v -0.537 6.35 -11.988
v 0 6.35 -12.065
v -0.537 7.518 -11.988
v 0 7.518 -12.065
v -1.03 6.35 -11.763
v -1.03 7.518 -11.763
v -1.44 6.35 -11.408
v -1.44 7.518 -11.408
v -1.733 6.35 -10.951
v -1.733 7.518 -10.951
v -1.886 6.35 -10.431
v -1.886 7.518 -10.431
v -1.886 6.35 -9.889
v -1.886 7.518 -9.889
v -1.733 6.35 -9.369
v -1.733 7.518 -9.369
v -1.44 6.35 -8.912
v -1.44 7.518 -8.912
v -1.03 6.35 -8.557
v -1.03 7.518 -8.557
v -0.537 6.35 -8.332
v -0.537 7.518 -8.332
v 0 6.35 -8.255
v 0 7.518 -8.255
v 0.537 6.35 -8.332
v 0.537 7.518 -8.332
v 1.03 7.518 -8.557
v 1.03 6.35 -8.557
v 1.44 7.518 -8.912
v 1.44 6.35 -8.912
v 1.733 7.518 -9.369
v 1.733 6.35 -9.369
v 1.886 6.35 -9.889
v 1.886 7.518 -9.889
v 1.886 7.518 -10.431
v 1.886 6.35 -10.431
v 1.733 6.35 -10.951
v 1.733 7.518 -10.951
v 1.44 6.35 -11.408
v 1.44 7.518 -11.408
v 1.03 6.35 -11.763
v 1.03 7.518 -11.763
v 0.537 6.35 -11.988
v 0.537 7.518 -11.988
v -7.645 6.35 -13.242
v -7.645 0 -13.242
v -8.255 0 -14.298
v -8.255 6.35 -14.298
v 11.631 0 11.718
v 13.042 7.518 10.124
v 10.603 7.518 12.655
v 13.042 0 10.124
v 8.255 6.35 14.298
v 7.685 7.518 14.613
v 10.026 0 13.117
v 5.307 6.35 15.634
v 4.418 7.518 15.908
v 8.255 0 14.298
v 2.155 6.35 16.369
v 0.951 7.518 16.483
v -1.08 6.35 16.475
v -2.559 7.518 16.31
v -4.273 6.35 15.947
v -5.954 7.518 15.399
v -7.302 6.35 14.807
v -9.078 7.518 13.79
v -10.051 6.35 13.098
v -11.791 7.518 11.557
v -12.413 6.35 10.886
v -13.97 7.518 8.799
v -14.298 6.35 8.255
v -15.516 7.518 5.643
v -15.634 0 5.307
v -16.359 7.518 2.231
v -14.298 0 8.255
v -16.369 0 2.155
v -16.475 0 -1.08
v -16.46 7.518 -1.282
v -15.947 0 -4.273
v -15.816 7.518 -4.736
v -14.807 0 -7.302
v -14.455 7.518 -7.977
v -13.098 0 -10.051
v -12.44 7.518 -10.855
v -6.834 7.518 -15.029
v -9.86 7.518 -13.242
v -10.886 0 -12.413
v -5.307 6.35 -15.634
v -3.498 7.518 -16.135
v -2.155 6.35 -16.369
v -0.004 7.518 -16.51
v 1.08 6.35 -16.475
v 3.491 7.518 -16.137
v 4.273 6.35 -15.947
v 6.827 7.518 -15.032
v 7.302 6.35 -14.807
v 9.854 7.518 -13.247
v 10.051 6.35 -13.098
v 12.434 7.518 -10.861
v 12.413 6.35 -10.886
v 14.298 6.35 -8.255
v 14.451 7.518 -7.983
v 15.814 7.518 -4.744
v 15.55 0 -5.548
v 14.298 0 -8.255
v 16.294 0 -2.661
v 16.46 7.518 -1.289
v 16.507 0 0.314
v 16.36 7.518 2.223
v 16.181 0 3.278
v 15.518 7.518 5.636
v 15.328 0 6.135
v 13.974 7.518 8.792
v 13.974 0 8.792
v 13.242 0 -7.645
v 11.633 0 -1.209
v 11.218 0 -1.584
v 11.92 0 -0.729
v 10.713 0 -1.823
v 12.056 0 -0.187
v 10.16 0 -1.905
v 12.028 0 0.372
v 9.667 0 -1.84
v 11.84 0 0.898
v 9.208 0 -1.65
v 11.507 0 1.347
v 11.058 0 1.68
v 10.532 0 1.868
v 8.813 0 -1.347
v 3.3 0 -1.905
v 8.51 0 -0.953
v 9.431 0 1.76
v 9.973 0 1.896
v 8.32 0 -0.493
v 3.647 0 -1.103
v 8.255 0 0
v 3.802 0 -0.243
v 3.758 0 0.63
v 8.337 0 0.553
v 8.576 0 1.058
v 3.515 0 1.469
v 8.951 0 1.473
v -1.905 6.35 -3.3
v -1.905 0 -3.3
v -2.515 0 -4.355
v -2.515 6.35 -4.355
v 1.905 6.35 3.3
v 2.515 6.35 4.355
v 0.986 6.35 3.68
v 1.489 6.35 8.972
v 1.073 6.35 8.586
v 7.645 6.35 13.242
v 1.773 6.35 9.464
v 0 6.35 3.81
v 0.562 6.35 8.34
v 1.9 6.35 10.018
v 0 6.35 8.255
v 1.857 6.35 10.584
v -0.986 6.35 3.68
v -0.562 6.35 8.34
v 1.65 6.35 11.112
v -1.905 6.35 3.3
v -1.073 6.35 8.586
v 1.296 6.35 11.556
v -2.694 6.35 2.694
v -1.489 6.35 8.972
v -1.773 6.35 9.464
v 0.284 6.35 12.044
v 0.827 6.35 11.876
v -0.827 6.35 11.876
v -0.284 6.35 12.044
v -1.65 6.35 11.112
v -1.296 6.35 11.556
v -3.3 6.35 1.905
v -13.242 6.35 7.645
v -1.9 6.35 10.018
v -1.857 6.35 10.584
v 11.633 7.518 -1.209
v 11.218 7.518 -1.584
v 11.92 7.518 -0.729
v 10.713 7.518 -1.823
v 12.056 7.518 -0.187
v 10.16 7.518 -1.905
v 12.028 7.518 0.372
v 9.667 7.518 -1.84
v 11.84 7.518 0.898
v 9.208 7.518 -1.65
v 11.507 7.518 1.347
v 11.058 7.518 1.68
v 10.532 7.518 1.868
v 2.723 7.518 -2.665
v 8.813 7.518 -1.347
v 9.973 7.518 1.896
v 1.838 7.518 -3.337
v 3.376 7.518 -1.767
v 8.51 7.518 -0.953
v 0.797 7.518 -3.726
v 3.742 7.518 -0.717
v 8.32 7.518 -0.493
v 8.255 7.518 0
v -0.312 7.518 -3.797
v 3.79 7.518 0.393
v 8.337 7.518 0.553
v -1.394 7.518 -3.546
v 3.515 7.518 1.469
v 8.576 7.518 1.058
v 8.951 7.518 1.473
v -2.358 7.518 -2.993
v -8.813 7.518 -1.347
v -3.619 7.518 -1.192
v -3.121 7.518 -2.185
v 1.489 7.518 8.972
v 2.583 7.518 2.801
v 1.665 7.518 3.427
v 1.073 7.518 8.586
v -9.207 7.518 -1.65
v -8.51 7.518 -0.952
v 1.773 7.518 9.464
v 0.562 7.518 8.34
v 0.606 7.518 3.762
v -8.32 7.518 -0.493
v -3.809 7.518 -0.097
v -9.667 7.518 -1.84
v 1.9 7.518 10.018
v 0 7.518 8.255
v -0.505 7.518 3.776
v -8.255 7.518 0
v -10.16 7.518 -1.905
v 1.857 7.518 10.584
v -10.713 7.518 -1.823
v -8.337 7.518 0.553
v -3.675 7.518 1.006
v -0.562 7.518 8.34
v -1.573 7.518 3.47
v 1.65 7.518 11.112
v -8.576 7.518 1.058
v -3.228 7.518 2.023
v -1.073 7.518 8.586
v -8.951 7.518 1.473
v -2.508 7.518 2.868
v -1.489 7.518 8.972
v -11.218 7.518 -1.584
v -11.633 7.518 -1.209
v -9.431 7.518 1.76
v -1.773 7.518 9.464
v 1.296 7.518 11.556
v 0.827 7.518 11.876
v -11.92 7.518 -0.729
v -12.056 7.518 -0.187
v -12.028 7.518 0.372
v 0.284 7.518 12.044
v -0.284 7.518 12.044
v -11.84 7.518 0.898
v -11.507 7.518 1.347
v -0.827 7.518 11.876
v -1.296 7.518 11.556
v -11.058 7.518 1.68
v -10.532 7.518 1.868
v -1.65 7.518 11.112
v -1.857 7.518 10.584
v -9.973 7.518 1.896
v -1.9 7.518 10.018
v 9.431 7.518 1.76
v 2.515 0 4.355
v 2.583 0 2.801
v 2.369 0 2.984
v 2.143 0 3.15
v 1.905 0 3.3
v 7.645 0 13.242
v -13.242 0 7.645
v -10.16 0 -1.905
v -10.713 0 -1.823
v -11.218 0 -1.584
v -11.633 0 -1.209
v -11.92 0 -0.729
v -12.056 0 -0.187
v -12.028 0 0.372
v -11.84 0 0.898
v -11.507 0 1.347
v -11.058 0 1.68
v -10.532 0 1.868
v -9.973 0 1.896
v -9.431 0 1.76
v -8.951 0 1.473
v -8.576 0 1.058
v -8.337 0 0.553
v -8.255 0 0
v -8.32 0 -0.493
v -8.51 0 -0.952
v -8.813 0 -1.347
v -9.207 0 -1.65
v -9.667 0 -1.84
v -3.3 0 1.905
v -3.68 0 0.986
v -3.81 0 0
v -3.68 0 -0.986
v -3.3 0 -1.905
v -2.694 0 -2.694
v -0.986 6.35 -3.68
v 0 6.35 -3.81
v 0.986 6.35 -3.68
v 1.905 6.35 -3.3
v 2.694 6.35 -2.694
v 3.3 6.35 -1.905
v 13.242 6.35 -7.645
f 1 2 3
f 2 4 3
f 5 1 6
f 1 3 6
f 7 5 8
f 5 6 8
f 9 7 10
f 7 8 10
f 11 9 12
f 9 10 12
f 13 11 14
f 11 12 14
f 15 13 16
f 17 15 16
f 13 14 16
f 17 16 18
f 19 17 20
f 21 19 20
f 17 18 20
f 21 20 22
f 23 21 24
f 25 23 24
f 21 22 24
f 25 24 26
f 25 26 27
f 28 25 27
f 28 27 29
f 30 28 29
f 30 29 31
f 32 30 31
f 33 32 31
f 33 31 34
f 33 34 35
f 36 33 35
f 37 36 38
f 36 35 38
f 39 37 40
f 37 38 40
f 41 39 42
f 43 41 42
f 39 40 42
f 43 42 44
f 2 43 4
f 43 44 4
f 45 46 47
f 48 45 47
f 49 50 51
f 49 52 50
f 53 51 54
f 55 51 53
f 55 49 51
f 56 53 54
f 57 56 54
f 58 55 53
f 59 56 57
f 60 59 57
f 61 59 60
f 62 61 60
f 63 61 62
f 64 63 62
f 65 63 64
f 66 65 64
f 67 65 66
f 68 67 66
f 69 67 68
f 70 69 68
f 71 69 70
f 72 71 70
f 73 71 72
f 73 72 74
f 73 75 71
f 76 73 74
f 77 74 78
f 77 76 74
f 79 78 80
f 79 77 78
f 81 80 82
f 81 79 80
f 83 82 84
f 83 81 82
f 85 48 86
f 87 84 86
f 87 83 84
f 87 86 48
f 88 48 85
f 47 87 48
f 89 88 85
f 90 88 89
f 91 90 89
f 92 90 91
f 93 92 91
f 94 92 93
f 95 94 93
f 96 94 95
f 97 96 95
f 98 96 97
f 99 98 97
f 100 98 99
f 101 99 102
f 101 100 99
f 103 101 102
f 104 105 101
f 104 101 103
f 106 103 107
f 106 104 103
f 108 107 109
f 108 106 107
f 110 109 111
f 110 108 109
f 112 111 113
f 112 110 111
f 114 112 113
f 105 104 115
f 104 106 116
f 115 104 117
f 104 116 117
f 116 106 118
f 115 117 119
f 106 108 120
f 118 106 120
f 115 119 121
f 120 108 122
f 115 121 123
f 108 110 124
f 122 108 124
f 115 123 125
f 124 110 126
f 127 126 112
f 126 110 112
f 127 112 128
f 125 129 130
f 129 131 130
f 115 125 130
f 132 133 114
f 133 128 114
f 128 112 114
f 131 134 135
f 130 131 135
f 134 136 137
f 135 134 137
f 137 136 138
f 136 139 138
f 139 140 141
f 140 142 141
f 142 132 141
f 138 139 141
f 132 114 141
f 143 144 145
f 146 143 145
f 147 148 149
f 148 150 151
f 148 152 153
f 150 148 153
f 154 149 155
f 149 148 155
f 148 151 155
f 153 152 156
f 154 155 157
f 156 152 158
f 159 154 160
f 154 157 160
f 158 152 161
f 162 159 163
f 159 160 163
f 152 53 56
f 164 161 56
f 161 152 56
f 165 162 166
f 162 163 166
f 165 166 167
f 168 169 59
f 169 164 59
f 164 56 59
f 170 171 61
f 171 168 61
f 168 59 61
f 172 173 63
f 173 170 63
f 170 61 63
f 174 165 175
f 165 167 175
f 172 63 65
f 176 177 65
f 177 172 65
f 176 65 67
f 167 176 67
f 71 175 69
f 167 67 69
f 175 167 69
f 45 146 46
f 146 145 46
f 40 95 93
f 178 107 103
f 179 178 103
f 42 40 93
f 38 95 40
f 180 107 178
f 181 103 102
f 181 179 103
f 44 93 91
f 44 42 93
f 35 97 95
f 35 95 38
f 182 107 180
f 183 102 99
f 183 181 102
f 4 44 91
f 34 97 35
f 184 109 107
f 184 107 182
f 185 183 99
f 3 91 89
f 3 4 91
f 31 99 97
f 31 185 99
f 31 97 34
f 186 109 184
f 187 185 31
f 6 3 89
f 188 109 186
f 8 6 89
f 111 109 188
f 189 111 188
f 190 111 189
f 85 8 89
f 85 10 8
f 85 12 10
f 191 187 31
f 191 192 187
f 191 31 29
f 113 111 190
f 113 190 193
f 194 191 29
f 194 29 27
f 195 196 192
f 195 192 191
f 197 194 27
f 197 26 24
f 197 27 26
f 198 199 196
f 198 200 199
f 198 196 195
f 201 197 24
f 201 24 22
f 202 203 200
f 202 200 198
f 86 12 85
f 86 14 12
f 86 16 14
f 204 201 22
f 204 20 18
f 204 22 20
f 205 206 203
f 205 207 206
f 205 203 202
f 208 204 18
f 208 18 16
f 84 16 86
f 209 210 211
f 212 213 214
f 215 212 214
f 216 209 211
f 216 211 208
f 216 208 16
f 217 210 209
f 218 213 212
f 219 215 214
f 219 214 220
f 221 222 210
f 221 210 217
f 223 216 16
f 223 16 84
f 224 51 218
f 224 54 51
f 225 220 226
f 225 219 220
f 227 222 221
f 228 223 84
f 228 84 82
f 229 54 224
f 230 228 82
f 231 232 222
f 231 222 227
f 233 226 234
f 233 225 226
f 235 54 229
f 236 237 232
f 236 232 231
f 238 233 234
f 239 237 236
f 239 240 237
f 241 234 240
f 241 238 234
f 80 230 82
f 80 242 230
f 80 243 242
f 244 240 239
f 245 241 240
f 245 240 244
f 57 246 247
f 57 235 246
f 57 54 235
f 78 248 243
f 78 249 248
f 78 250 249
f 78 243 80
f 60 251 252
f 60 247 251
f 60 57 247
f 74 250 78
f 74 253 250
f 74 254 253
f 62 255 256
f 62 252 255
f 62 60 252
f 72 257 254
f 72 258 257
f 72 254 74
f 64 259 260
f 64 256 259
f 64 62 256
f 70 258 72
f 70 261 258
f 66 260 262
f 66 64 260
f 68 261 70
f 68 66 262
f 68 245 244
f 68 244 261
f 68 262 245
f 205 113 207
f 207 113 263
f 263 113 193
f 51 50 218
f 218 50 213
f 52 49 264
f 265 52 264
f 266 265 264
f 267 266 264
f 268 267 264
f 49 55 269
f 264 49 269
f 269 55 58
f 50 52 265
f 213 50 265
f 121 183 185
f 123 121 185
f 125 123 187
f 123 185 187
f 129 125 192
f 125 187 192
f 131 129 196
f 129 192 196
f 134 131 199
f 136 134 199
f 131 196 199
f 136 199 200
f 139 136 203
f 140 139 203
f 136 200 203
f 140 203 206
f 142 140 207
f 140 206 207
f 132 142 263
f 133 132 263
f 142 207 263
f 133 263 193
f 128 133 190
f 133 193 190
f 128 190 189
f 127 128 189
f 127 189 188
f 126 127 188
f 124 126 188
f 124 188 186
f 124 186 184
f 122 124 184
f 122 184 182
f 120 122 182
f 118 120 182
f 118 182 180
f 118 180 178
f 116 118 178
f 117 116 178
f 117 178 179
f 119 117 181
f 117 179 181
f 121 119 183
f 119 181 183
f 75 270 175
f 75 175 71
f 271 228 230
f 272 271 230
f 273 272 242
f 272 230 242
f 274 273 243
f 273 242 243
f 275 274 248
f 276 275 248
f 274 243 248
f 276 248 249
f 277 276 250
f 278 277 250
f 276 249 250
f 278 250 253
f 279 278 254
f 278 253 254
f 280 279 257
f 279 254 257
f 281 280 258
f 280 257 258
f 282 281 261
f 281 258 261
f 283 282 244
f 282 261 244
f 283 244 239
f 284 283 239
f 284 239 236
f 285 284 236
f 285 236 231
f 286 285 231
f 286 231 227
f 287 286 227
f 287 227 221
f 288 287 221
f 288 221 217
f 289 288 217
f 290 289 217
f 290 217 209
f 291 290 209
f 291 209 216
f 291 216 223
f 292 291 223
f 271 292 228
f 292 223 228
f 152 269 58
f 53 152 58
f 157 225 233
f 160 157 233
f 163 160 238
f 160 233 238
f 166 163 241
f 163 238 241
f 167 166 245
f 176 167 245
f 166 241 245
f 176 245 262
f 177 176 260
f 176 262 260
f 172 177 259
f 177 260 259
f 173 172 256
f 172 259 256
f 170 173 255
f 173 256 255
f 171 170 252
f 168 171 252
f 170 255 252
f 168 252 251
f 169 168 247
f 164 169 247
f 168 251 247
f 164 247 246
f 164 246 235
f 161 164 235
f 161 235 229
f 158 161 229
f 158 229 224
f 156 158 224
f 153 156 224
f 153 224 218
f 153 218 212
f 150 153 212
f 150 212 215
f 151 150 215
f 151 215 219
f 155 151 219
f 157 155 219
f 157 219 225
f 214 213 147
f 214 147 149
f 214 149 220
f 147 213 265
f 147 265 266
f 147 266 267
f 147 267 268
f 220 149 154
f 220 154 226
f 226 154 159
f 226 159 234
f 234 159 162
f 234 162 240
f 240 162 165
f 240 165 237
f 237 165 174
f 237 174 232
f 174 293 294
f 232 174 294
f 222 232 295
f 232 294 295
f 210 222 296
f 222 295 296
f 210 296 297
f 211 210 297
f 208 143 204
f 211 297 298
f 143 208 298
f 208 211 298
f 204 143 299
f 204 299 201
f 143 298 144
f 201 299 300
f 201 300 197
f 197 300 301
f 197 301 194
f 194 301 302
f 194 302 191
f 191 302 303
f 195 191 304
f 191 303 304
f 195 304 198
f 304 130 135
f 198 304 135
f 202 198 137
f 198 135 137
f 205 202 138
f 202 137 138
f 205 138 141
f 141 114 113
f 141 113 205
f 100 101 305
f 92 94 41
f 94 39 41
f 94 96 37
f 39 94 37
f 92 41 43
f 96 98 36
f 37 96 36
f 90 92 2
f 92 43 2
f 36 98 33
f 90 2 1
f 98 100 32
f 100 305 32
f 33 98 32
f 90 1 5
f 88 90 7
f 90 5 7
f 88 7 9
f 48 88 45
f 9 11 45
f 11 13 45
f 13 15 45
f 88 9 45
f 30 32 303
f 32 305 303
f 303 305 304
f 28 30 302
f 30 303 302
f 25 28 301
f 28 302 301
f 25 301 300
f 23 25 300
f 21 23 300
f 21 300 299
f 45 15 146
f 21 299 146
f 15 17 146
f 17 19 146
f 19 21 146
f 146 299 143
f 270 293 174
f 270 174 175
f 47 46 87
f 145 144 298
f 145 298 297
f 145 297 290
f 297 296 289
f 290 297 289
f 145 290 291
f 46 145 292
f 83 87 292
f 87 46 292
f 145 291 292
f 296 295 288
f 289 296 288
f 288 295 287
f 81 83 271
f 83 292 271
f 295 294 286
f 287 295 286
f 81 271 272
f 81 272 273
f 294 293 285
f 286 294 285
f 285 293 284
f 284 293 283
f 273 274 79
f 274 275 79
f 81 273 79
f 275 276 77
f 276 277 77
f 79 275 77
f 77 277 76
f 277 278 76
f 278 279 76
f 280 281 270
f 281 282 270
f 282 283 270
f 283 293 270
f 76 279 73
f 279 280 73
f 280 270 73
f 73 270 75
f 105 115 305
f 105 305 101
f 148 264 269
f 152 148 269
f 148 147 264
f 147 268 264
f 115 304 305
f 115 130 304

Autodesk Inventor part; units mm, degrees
ref_plane "YZ Plane" through (0, 0, 0) normal (1, 0, 0) x (0, 1, 0)
ref_plane "XZ Plane" through (0, 0, 0) normal (0, 1, 0) x (-1, 0, 0)
ref_plane "XY Plane" through (0, 0, 0) normal (0, 0, 1) x (1, 0, 0)
sketch "Sketch1" plane through (0, 0, 0) normal (0, 1, 0) x (-1, 0, 0)
  circle A0 centre (0, 0) radius 3.81
  circle A1 centre (0, 0) radius 16.51
  line L0 (0, 0) -> (10.16, 0)
  line L1 (0, 0) -> (-10.16, 0)
  circle A2 centre (10.16, 0) radius 1.524
  circle A3 centre (-10.16, 0) radius 1.524
  circle A4 centre (0, 0) radius 5.0292
  circle A5 centre (0, 0) radius 15.2908
  line L2 (0, 0) -> (0, 10.16)
  circle A6 centre (0, 10.16) radius 2.3812
  line L3 (0, 0) -> (2.5146, 4.3554)
  line L4 (0, 0) -> (5.0292, 0) construction
  line L5 (2.5146, 4.3554) -> (7.6454, 13.2422)
  line L6 (0, 0) -> (-2.5146, 4.3554)
  line L7 (-2.5146, 4.3554) -> (-7.6454, 13.2422)
  line L8 (0, 0) -> (2.5146, -4.3554)
  line L9 (2.5146, -4.3554) -> (7.6454, -13.2422)
  line L10 (0, 0) -> (-2.5146, -4.3554)
  line L11 (-2.5146, -4.3554) -> (-7.6454, -13.2422)
  line L12 (0.4064, 16.8443) -> (-0.4064, 16.8443)
  line L13 (-0.4064, 16.8443) -> (-0.4064, 15.0672)
  line L14 (-0.4064, 15.0672) -> (0.4064, 15.0672)
  line L15 (0.4064, 15.0672) -> (0.4064, 16.8443)
  line L16 (0.4064, 16.8443) -> (-0.4064, 15.0672) construction
  line L17 (-0.4064, 16.8443) -> (0.4064, 15.0672) construction
  line L18 (0.4064, -15.0362) -> (-0.4064, -15.0362)
  line L19 (-0.4064, -15.0362) -> (-0.4064, -16.8142)
  line L20 (-0.4064, -16.8142) -> (0.4064, -16.8142)
  line L21 (0.4064, -16.8142) -> (0.4064, -15.0362)
  line L22 (0.4064, -15.0362) -> (-0.4064, -16.8142) construction
  line L23 (-0.4064, -15.0362) -> (0.4064, -16.8142) construction
  circle A7 centre (0, 10.16) radius 1.524
  line L24 (0, 0) -> (0, -10.16)
  circle A8 centre (0, -10.16) radius 1.524
  circle A9 centre (0, 0) radius 0.7937
  line L25 (0, 0) -> (-13.5242, 9.4697)
  line L26 (0, 0) -> (16.51, 0) construction
  line L27 (-13.9904, 8.8039) -> (-0.408, -0.7066)
  line L28 (-13.058, 10.1356) -> (0.2563, 0.8128)
  line L29 (16.49, 0.8128) -> (16.51, 0.8128)
  line L30 (16.49, -0.8128) -> (16.51, -0.8128)
  line L31 (0, 0) -> (-0.408, -0.7066)
  line L32 (0.2563, 0.8128) -> (0.408, 0.7066)
  line L33 (0, 0) -> (0.408, 0.7066)
  line L34 (-13.058, 10.1356) -> (-13.9904, 8.8039)
  line L35 (0.408, 0.7066) -> (-0.408, -0.7066)
  line L36 (-7.6454, 13.2422) -> (-8.255, 14.2981)
  line L37 (7.6454, 13.2422) -> (8.255, 14.2981)
  line L38 (-7.6454, -13.2422) -> (-8.255, -14.2981)
  line L39 (7.6454, -13.2422) -> (8.255, -14.2981)
  line L40 (0, 0) -> (13.2422, 7.6454)
  line L41 (13.2422, 7.6454) -> (14.2981, 8.255)
  line L42 (0, 0) -> (-13.2422, -7.6454)
  line L43 (-13.2422, -7.6454) -> (-14.2981, -8.255)
  point P0 (0, 15.9557)
  point P1 (0, -15.9252)
  point P2 (-13.974, 8.7925)
  point P3 (-1.4171, 0)
  point P4 (-0.7937, 0)
  point P5 (-0.3969, 0.6874)
  point P6 (-0.9616, 1.6656)
  point P7 (-13.0416, 10.1241)
  point P8 (1.905, 3.2996)
  point P9 (-1.905, 3.2996)
  point P10 (1.905, -3.2996)
  point P11 (-1.905, -3.2996)
  point P12 (4.3554, 2.5146)
  point P13 (-4.3554, -2.5146)
  point P14 (3.2996, 1.905)
  point P15 (-3.2996, -1.905)
  dimension "d1" = 33.02
  dimension "d0" = 7.62
  dimension "d2" = 10.16
  dimension "d3" = 10.16
  dimension "d4" = 3.048
  dimension "d5" = 3.048
  dimension "d8" = 10.0584
  dimension "d9" = 30.5816
  dimension "d10" = 10.16
  dimension "d11" = 4.7625
  dimension "d12" = 60
  dimension "d17" = 0.8128
  dimension "d18" = 0.8128
  dimension "d19" = 1.778
  dimension "d24" = 3.048
  dimension "d25" = 10.16
  dimension "d26" = 3.048
  dimension "d41" = 1.5875
  dimension "d42" = 145
  dimension "d43" = 0.8128
  dimension "d44" = 0.8128
extrude "Extrusion1" add sketch "Sketch1" along normal blind 7.5184 contours L0 A4 L8 A0 | A0 L40 A4 L0 | A0 L3 A4 L40 | L8 A4 L24 A0 | A2 | A4 L40 A5 L9 | A0 L2 A4 L3 | A4 L5 A5 L40 | L24 A4 L10 A0 | A8 | L9 A5 L21 L18 L19 L11 A4 | A0 L6 A4 L2 | A7 | A6 | A4 L7 A5 L13 L14 L15 L5 | L41 A1 L39 A5 | A5 L37 A1 L41 | L10 A4 L42 A0 | L39 A1 L21 A5 | A0 L28 A4 L6 | A5 L15 A1 L37 | L42 A4 L1 A0 | L11 A5 L42 A4 | L21 A1 L19 A5 | A5 L19 L18 L21 | L25 A4 L28 A0 | A0 L27 A4 L25 | A4 L28 A5 L7 | L15 L14 L13 A5 | A5 L13 A1 L15 | L1 A4 L27 A0 | A3 | L42 A5 L27 A4 | L38 A1 L43 A5 | A5 L19 A1 L38 | L25 A5 L28 A4 | A4 L27 A5 L25 | L36 A1 L13 A5 | A5 L28 A1 L36 | L43 A1 L27 A5 | L25 A1 L28 A5 | A5 L27 A1 L25
extrude "Extrusion2" cut sketch "Sketch1" along normal blind 6.35 contours A0 L3 A4 L40 | A0 L2 A4 L3 | A4 L5 A5 L40 | A0 L6 A4 L2 | A7 | A6 | A4 L7 A5 L13 L14 L15 L5 | A5 L37 A1 L41 | A5 L15 A1 L37 | L15 L14 L13 A5 | A5 L13 A1 L15 | L36 A1 L13 A5
extrude "Extrusion3" cut sketch "Sketch1" along normal blind 6.35 contours L8 A4 L24 A0 | L24 A4 L10 A0 | A8 | L9 A5 L21 L18 L19 L11 A4 | L10 A4 L42 A0 | L39 A1 L21 A5 | L11 A5 L42 A4 | L21 A1 L19 A5 | A5 L19 L18 L21 | L38 A1 L43 A5 | A5 L19 A1 L38
extrude "Extrusion6" cut sketch "Sketch1" along normal blind 7.5184 contours L1 L27 A0 L25 A9 | A9 L25 A0 L28 L6 | L25 A4 L28 A0 | A0 L27 A4 L25 | L25 A5 L28 A4 | A4 L27 A5 L25 | L25 A1 L28 A5 | A5 L27 A1 L25
hole "Hole3" at (10.16, 0, 0) direction (0, 1, 0) diameter 3.81 end through all clearance for "Flat Head Machine Screw (82)" size "#6" standard "Ansi Unified Screw Threads"
hole "Hole4" at (-10.16, 0, 0) direction (0, 1, 0) diameter 3.81 end through all clearance for "Flat Head Machine Screw (82)" size "#6" standard "Ansi Unified Screw Threads"
hole "Hole5" at (0, 0, -10.16) direction (0, 1, 0) diameter 3.81 end through all clearance for "Flat Head Machine Screw (82)" size "#6" standard "Ansi Unified Screw Threads"
hole "Hole6" at (0, 0, 10.16) direction (0, 1, 0) diameter 3.81 end through all clearance for "Flat Head Machine Screw (82)" size "#6" standard "Ansi Unified Screw Threads"
properties part number "tab3"
